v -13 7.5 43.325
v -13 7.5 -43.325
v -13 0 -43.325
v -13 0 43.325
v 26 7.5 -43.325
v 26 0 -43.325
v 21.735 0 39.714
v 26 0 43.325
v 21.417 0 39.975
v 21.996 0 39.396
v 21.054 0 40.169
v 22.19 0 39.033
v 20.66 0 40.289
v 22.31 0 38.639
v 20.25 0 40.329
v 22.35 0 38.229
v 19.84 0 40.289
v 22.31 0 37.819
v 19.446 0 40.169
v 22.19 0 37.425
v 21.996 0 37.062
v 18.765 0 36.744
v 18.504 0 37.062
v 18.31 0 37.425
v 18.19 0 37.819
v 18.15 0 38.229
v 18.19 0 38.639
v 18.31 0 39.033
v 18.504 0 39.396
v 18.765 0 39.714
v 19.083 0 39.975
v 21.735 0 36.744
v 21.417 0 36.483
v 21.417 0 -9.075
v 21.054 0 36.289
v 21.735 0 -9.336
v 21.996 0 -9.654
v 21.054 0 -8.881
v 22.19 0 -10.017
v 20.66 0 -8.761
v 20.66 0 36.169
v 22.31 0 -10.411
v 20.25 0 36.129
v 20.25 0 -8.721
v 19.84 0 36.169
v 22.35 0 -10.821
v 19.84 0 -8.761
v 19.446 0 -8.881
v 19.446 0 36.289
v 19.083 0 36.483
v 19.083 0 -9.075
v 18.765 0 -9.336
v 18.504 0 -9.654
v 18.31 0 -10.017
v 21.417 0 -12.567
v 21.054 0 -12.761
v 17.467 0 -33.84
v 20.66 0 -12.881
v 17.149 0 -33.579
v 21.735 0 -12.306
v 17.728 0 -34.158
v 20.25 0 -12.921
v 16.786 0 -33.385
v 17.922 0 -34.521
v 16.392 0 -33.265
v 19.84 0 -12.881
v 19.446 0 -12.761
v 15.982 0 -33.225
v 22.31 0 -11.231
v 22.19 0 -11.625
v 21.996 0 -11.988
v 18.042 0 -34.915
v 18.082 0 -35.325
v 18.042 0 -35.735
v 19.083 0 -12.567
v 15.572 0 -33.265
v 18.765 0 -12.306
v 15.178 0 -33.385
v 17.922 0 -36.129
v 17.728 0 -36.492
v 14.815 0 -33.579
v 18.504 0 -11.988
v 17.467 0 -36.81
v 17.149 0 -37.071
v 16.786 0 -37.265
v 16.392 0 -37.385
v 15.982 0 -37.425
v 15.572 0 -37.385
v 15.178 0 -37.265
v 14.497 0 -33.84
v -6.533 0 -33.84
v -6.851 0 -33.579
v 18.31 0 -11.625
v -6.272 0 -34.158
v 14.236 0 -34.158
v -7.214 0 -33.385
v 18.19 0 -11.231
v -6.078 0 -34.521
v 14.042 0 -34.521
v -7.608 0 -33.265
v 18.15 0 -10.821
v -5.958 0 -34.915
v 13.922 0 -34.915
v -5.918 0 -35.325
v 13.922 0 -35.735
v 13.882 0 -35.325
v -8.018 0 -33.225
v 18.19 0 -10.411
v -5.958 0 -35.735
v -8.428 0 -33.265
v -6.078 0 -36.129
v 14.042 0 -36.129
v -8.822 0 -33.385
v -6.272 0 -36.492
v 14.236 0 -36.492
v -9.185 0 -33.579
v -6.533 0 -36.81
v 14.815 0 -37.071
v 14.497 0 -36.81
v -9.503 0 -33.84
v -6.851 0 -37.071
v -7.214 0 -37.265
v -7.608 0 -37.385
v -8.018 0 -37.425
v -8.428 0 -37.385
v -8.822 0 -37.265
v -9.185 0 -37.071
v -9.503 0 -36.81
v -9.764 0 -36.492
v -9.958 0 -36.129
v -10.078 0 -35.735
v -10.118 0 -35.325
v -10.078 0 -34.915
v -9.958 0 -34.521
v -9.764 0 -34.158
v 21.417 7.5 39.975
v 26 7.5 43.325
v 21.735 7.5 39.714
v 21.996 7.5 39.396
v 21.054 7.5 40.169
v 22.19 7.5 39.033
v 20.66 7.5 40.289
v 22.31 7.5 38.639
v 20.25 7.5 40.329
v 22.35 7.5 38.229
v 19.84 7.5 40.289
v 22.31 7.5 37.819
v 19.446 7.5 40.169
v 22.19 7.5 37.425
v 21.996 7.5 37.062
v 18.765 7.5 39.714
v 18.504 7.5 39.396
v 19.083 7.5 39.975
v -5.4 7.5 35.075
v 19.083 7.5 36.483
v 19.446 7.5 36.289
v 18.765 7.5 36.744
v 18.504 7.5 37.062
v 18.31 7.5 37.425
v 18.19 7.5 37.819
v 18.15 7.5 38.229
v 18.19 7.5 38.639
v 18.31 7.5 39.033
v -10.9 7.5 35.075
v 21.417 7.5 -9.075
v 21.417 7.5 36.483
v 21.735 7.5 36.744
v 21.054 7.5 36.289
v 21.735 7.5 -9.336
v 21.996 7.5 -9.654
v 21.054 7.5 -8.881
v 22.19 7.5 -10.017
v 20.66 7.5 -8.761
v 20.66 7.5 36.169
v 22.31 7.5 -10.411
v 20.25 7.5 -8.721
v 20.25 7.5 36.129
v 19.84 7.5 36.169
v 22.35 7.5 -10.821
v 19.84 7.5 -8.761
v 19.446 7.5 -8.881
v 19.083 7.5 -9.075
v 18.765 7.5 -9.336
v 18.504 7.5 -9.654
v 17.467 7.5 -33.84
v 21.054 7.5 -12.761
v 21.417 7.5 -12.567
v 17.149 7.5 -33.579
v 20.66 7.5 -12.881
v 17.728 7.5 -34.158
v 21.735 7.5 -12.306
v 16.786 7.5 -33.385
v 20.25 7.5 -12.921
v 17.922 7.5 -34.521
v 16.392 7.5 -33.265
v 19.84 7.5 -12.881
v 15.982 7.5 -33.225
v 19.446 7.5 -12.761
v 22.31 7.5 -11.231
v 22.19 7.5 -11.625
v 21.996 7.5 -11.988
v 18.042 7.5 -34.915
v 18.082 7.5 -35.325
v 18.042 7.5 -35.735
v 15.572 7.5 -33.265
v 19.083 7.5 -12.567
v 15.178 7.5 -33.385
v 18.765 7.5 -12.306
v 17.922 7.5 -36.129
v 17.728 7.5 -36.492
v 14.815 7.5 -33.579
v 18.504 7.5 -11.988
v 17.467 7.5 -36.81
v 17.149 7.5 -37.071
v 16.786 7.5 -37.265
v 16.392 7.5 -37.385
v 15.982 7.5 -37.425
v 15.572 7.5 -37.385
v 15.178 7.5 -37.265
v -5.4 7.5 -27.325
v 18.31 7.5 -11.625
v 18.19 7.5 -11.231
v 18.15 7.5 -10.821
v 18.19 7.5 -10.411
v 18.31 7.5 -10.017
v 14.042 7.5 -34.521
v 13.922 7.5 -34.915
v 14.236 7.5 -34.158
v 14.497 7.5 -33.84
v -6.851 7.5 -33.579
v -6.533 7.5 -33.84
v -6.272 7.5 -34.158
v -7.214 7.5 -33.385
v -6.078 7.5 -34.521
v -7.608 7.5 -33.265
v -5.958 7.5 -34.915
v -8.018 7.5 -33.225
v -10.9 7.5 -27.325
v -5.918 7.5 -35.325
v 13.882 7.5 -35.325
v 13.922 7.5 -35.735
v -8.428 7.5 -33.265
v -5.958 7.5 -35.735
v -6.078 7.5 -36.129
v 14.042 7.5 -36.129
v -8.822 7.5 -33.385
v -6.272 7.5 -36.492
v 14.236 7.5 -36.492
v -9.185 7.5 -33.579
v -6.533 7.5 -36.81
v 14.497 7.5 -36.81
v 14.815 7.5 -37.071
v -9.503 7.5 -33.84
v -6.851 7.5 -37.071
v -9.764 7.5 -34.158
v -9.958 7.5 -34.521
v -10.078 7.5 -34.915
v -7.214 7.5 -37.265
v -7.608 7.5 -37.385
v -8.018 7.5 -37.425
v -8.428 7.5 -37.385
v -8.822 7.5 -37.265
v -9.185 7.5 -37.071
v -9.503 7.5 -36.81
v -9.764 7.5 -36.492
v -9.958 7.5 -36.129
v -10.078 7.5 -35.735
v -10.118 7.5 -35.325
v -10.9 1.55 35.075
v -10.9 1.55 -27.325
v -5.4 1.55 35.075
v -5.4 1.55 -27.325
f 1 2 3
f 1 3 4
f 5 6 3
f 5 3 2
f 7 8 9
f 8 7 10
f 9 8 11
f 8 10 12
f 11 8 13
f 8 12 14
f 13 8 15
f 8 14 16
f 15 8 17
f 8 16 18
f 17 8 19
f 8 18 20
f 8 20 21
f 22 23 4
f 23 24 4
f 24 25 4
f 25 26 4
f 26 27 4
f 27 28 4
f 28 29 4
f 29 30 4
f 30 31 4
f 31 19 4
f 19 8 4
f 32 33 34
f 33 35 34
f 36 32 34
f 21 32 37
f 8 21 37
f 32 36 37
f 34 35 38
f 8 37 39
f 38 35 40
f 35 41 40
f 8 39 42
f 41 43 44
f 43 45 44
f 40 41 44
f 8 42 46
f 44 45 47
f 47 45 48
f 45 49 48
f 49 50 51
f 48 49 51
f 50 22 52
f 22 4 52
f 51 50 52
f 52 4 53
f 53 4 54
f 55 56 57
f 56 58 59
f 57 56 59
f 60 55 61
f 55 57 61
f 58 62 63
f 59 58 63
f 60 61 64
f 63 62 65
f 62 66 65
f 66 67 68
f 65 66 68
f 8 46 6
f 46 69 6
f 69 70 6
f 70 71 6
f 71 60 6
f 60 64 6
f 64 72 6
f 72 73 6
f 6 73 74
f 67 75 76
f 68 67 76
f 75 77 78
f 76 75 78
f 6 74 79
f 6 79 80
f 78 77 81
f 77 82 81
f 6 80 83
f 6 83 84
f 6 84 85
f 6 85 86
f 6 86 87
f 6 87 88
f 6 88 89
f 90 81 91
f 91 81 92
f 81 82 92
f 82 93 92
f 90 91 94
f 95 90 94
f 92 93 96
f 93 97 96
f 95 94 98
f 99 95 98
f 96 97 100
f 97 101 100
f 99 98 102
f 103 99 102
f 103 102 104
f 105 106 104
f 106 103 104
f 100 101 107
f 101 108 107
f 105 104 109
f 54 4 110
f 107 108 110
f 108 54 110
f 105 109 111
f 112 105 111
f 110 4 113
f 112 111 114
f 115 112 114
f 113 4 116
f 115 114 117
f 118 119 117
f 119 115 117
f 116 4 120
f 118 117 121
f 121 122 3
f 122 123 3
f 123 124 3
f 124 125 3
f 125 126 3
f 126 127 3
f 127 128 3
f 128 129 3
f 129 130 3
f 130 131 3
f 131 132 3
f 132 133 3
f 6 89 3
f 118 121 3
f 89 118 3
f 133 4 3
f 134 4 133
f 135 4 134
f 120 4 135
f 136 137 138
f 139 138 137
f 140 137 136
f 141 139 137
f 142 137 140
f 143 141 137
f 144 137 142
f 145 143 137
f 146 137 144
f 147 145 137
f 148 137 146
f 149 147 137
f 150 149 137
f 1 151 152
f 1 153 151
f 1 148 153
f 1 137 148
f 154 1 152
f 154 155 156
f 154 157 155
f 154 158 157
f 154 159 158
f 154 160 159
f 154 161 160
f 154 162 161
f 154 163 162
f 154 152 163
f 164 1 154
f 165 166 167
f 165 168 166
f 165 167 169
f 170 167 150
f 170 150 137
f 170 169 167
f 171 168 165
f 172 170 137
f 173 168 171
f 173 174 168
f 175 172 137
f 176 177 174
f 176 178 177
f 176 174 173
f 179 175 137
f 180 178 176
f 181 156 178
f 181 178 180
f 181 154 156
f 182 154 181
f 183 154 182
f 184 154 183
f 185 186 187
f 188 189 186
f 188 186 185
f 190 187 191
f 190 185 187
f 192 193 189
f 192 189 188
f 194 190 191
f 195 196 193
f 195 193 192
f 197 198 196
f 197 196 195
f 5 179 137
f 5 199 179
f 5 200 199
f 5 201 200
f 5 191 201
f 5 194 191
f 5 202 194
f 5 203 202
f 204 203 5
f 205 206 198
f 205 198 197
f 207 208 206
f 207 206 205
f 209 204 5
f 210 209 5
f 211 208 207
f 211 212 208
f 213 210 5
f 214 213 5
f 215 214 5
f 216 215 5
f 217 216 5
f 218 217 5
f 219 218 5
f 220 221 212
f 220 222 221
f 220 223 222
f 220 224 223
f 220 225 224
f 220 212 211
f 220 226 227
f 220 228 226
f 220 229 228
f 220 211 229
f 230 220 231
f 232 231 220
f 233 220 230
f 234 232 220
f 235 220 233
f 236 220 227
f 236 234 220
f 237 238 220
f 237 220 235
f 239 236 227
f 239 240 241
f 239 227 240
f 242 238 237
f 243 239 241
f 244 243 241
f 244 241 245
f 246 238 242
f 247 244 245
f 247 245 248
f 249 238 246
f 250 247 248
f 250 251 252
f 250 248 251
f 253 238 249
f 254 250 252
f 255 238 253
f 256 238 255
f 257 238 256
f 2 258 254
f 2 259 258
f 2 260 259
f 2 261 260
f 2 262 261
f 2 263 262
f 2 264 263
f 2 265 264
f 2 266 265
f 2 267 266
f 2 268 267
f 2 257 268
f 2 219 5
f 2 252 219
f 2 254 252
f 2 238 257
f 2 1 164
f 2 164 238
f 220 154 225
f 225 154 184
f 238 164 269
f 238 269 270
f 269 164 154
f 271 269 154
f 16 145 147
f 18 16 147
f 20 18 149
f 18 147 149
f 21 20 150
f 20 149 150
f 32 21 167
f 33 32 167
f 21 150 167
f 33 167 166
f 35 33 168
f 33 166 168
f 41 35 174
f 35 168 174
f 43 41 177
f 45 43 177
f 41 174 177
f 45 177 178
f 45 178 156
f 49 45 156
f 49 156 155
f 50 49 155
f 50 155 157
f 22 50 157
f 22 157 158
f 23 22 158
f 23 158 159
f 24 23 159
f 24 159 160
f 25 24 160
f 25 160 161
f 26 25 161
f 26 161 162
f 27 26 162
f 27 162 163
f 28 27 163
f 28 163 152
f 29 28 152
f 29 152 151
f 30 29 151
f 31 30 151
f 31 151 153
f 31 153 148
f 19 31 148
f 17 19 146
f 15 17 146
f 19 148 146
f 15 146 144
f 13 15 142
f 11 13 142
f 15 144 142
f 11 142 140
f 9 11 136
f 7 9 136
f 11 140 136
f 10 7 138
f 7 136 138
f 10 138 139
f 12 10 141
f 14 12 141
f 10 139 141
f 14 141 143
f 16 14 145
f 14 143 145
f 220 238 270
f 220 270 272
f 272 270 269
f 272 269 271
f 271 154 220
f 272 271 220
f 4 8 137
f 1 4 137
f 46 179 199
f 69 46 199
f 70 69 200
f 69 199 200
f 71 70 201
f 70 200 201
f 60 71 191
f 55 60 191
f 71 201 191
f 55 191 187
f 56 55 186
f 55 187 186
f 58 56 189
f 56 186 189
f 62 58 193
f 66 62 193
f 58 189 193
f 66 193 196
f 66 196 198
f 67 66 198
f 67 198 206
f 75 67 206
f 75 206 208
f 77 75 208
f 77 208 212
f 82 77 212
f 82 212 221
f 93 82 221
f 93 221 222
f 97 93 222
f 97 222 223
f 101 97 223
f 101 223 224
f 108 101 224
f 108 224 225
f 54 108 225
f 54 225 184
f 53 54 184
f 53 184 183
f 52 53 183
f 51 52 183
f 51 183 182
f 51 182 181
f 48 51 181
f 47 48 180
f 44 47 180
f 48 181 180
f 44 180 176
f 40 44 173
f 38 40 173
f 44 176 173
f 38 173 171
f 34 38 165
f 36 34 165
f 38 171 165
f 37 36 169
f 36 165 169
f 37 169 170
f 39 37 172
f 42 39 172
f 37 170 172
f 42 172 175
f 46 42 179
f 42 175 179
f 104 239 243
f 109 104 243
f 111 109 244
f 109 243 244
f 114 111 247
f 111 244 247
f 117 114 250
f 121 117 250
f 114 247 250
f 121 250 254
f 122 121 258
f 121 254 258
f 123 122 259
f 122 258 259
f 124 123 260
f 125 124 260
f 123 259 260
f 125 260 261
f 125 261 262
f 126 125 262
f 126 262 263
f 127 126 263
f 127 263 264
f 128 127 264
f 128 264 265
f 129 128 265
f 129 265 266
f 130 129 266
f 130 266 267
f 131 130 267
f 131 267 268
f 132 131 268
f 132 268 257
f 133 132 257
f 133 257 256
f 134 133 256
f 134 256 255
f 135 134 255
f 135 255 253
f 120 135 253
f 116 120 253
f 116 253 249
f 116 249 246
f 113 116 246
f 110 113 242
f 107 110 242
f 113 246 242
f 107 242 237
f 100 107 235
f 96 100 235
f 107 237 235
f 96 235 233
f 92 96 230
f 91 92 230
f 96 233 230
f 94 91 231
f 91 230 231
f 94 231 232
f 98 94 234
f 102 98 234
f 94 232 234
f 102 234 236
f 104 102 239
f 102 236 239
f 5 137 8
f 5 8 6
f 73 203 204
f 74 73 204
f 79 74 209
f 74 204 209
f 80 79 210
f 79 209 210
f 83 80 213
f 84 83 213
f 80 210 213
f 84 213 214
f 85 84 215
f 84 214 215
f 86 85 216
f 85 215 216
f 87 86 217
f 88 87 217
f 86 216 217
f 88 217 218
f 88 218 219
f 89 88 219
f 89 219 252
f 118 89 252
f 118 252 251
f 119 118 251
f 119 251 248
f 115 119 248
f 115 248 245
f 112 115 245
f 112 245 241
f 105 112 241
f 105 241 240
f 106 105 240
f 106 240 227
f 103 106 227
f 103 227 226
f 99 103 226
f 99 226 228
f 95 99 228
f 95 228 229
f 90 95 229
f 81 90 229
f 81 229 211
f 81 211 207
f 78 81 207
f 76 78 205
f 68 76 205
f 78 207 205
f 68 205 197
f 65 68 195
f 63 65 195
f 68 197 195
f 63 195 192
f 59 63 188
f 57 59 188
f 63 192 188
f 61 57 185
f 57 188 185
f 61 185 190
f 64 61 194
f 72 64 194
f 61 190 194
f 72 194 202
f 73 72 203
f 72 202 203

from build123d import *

# Parameters (mm, degrees)
SKETCH1_W           = 50
SKETCH1_H           = 86.65
BOSS_EXTRUDE1_DEPTH = 7.5
SKETCH7_W           = 5.5
SKETCH7_H           = 62.4
CUT_EXTRUDE5_DEPTH  = 5.95
SKETCH11_R          = 2.1
CUT_EXTRUDE8_DEPTH  = 8.5
SKETCH12_R          = 2.1
CUT_EXTRUDE10_DEPTH = 8.5
SKETCH13_W          = 86.65
SKETCH13_H          = 7.5
BOSS_EXTRUDE2_DEPTH = 1
SKETCH14_W          = 86.65
SKETCH14_H          = 7.5
CUT_EXTRUDE11_DEPTH = 12


with BuildPart() as part:
    # Sketch1 → Boss-Extrude1 (new body)
    with BuildSketch(Plane(origin=(0, 0, 0), x_dir=(1, 0, 0), z_dir=(0, 1, 0))):
        Rectangle(SKETCH1_W, SKETCH1_H)
    extrude(amount=BOSS_EXTRUDE1_DEPTH)

    # Sketch7 → Cut-Extrude5 (cut)
    with BuildSketch(Plane(origin=(0, 7.5, 0), x_dir=(1, 0, 0), z_dir=(0, 1, 0))):
        with Locations((-8.15, -3.875)):
            Rectangle(SKETCH7_W, SKETCH7_H)
    extrude(amount=-CUT_EXTRUDE5_DEPTH, mode=Mode.SUBTRACT)

    # Sketch11 → Cut-Extrude8 (cut, through all)
    with BuildSketch(Plane(origin=(0, 7.5, 0), x_dir=(1, 0, 0), z_dir=(0, 1, 0))):
        with Locations((15.982, 35.325)):
            Circle(SKETCH11_R)
        with Locations((-8.018, 35.325)):
            Circle(SKETCH11_R)
    extrude(amount=-CUT_EXTRUDE8_DEPTH, mode=Mode.SUBTRACT)

    # Sketch12 → Cut-Extrude10 (cut, through all)
    with BuildSketch(Plane(origin=(0, 7.5, 0), x_dir=(1, 0, 0), z_dir=(0, 1, 0))):
        with Locations((20.25, 10.821)):
            Circle(SKETCH12_R)
        with Locations((20.25, -38.229)):
            Circle(SKETCH12_R)
    extrude(amount=-CUT_EXTRUDE10_DEPTH, mode=Mode.SUBTRACT)

    # Sketch13 → Boss-Extrude2 (add)
    with BuildSketch(Plane(origin=(25, 0, 0), x_dir=(0, 0, -1), z_dir=(1, 0, 0))):
        with Locations((0, 3.75)):
            Rectangle(SKETCH13_W, SKETCH13_H)
    extrude(amount=BOSS_EXTRUDE2_DEPTH)

    # Sketch14 → Cut-Extrude11 (cut)
    with BuildSketch(Plane.ZY.offset(25)):
        with Locations((0, 3.75)):
            Rectangle(SKETCH14_W, SKETCH14_H)
    extrude(amount=-CUT_EXTRUDE11_DEPTH, mode=Mode.SUBTRACT)


solid = part.part
